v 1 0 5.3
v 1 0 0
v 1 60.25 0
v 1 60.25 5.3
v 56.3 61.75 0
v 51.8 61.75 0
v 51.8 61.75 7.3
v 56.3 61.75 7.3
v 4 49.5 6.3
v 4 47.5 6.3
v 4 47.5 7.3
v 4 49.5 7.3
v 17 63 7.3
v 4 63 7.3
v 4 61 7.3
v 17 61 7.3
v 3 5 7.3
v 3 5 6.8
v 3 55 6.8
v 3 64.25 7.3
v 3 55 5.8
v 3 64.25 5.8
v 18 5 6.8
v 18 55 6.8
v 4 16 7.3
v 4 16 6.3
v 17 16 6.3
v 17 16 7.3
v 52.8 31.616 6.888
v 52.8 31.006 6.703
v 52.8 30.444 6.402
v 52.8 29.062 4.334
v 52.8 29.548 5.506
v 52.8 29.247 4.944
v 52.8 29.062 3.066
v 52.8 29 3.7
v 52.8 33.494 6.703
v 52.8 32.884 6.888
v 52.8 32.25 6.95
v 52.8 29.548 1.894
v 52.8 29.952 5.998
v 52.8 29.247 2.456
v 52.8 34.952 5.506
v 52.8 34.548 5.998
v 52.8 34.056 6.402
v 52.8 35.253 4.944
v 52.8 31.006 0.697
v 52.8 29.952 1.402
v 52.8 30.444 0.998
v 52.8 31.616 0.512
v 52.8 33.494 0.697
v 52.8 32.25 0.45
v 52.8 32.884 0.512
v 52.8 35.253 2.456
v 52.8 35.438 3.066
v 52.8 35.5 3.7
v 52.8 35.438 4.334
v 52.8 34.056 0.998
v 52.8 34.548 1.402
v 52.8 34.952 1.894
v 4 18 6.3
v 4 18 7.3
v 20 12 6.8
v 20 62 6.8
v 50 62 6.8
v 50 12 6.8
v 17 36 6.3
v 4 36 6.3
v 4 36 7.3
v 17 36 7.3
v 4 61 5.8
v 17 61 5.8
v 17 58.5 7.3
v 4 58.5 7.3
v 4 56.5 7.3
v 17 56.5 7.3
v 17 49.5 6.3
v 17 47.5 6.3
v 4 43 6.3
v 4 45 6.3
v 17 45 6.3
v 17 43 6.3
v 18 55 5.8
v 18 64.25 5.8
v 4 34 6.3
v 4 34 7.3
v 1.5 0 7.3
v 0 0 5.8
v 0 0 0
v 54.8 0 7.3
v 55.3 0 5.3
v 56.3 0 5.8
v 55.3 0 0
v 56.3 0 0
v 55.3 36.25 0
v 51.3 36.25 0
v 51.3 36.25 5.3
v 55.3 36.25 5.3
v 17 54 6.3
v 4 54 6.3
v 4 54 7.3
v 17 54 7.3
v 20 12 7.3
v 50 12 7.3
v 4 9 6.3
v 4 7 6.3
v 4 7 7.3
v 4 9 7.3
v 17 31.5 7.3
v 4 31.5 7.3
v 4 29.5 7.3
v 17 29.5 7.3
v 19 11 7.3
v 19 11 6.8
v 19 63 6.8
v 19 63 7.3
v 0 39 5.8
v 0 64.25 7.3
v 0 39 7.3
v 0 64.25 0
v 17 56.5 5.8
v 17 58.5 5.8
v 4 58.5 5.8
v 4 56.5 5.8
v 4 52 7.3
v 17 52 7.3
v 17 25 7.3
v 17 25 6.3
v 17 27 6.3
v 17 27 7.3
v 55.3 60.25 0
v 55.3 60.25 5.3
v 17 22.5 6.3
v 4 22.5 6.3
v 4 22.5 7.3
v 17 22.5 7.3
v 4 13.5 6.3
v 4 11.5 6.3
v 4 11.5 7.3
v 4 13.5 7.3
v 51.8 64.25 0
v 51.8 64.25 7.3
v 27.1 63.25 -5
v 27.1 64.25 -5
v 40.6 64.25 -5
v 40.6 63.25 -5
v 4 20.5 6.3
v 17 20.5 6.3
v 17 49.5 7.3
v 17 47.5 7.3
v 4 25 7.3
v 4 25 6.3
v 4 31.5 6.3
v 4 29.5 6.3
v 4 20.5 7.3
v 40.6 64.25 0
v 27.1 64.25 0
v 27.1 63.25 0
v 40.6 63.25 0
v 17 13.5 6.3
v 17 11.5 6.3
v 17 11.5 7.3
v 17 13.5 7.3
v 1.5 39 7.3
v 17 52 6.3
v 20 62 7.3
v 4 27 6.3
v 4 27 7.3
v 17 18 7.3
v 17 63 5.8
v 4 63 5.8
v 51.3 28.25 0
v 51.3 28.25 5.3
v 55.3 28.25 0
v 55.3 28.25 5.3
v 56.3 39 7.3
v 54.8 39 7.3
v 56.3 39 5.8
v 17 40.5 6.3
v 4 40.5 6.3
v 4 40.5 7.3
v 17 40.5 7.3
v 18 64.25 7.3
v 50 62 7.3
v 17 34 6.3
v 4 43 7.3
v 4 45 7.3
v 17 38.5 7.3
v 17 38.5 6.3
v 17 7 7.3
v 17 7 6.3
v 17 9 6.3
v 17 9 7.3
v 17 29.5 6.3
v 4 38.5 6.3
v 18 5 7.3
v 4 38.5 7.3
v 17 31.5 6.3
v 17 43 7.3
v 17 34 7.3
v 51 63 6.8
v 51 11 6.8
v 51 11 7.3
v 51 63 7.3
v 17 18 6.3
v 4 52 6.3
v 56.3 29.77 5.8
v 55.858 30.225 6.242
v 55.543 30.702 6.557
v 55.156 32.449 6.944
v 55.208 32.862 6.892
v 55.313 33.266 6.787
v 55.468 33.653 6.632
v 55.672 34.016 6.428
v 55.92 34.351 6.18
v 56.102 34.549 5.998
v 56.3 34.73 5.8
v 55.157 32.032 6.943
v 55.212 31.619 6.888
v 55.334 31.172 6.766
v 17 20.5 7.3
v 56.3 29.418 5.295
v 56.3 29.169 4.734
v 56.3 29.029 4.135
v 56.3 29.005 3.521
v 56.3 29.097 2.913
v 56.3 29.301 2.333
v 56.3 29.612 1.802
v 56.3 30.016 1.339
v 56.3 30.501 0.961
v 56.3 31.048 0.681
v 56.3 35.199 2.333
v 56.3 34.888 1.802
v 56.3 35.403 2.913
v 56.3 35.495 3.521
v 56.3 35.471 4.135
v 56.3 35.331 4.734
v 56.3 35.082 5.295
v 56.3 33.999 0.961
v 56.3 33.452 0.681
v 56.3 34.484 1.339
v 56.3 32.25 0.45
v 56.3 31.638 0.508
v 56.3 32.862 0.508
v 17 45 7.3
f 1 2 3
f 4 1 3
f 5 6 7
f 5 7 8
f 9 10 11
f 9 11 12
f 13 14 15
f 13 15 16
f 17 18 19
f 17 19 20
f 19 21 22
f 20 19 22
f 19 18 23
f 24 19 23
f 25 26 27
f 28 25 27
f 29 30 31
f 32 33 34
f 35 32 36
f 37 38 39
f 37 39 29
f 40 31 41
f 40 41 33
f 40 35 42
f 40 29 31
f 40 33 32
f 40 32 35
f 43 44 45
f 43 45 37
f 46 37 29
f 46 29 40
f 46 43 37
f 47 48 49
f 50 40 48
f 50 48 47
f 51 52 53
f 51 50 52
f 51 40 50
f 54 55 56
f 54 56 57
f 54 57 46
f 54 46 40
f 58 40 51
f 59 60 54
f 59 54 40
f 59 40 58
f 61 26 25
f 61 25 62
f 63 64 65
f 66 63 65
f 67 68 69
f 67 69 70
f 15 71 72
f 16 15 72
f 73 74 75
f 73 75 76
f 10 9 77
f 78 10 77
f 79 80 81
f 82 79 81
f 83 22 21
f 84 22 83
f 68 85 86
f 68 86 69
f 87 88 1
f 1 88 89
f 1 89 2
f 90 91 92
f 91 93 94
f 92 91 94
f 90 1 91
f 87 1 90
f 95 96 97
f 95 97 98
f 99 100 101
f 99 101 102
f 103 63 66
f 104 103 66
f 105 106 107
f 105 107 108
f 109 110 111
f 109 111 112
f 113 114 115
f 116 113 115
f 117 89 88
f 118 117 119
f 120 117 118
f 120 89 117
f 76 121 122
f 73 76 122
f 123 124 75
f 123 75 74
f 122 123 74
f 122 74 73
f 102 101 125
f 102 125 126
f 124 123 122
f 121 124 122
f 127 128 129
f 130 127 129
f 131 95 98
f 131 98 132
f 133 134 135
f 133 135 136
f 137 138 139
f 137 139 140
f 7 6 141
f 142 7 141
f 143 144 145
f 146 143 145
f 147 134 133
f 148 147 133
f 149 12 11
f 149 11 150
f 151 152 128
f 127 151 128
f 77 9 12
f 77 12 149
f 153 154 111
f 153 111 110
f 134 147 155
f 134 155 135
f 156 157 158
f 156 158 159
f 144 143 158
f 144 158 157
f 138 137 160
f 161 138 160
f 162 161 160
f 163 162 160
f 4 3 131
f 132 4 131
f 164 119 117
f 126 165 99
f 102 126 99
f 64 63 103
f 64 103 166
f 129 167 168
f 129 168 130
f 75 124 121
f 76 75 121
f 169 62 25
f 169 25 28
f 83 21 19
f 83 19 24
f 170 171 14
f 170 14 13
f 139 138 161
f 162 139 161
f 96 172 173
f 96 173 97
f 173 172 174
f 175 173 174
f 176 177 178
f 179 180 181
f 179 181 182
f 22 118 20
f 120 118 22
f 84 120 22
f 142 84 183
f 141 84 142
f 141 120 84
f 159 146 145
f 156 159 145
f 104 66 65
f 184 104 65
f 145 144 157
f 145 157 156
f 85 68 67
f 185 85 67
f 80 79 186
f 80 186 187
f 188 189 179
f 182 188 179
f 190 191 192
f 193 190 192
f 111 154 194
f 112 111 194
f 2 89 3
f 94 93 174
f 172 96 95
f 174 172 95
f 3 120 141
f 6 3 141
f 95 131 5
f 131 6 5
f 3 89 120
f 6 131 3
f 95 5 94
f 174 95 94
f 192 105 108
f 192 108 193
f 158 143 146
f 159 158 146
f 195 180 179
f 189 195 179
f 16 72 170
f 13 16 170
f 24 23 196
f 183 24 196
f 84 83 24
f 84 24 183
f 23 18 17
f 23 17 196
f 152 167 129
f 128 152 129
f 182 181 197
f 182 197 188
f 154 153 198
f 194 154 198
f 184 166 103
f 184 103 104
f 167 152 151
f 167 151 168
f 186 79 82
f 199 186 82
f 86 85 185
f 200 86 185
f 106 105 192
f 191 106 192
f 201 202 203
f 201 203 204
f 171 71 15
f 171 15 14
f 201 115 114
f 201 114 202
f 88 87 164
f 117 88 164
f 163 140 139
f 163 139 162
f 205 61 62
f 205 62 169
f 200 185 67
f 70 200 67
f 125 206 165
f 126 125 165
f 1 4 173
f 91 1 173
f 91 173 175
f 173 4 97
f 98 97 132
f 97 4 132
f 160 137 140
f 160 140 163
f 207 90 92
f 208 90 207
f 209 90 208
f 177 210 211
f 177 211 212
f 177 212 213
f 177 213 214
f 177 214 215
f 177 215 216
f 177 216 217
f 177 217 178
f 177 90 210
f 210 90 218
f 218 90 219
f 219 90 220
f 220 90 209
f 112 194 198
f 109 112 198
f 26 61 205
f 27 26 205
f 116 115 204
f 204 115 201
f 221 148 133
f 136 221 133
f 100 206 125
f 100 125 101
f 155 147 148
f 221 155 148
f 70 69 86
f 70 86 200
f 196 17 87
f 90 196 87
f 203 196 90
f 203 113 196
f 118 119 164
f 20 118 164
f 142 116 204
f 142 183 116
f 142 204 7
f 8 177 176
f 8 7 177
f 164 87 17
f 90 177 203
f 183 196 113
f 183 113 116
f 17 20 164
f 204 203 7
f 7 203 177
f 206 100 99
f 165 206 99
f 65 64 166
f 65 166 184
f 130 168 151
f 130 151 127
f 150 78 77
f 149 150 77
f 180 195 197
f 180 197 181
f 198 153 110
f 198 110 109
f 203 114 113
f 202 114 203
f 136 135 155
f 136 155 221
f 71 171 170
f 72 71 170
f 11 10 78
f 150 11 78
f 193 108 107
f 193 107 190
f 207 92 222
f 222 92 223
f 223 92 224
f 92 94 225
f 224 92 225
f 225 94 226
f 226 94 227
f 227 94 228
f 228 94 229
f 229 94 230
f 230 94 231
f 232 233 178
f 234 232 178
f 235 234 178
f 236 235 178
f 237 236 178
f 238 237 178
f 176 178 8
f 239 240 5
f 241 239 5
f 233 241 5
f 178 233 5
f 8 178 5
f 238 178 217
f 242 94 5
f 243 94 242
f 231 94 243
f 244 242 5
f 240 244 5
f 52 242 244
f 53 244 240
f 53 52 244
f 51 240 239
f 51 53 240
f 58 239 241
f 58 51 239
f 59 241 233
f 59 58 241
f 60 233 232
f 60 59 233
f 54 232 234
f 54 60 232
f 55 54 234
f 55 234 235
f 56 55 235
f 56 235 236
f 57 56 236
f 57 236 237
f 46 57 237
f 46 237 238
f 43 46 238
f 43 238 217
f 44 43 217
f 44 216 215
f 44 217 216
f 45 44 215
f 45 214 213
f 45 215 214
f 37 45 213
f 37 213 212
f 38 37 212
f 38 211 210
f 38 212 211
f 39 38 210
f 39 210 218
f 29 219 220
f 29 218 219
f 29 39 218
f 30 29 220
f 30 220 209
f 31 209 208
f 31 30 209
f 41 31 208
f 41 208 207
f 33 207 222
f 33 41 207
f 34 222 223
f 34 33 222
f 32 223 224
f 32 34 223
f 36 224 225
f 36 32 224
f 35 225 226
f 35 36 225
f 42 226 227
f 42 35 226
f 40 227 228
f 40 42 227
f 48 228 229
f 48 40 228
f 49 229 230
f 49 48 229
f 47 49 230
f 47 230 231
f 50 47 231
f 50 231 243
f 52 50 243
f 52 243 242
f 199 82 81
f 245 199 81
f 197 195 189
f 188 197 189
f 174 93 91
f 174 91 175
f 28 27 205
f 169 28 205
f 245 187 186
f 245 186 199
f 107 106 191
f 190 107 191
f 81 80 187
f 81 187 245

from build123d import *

# Parameters (mm, degrees)
BOX017_W       = 30
BOX017_H       = 50
BOX017_DEPTH   = 0.5
BOX020_W       = 13
BOX020_H       = 2
BOX020_DEPTH   = 1
BOX021_W       = 13
BOX021_H       = 2
BOX021_DEPTH   = 1
BOX022_W       = 13
BOX022_H       = 2
BOX022_DEPTH   = 1
BOX023_W       = 13
BOX023_H       = 2
BOX023_DEPTH   = 1
BOX024_W       = 13
BOX024_H       = 2
BOX024_DEPTH   = 1
BOX025_W       = 13
BOX025_H       = 2
BOX025_DEPTH   = 1
BOX030_W       = 13
BOX030_H       = 2
BOX030_DEPTH   = 1
BOX031_W       = 13
BOX031_H       = 2
BOX031_DEPTH   = 1
BOX032_W       = 13
BOX032_H       = 2
BOX032_DEPTH   = 1
BOX034_W       = 13
BOX034_H       = 2
BOX034_DEPTH   = 1
BOX035_W       = 13
BOX035_H       = 2
BOX035_DEPTH   = 1
BOX038_W       = 13
BOX038_H       = 2
BOX038_DEPTH   = 1.5
BOX040_W       = 13
BOX040_H       = 2
BOX040_DEPTH   = 1.5
BOX043_W       = 13.5
BOX043_H       = 1
BOX043_DEPTH   = 5
CYLINDER_R     = 3.25
CYLINDER_DEPTH = 3.5
BOX042_W       = 54.3
BOX042_H       = 60.25
BOX042_DEPTH   = 5.3
BOX001_W       = 4.5
BOX001_H       = 2.5
BOX001_DEPTH   = 5.3
BOX_W          = 56.3
BOX_H          = 64.25
BOX_DEPTH      = 5.3
BOX041_W       = 32
BOX041_H       = 52
BOX041_DEPTH   = 0.5
BOX018_W       = 15
BOX018_H       = 53
BOX018_DEPTH   = 0.5
BOX008_W       = 56.3
BOX008_H       = 39
BOX008_DEPTH   = 2
CHAMFER_SIZE   = 1.5
BOX019_W       = 15
BOX019_H       = 9.25
BOX019_DEPTH   = 1.5
BOX029_W       = 17
BOX029_H       = 9.25
BOX029_DEPTH   = 1.5
BOX010_W       = 10
BOX010_H       = 10
BOX010_DEPTH   = 10
BOX007_W       = 56.3
BOX007_H       = 25.25
BOX007_DEPTH   = 2
BOX044_W       = 4
BOX044_H       = 8
BOX044_DEPTH   = 5.3


with BuildPart() as cube_game_lable_inner:
    # Box017 → Box017 (new body)
    with BuildSketch(Plane(origin=(20, 12, 6.8), x_dir=(1, 0, 0), z_dir=(0, 0, 1))):
        with Locations((15, 25)):
            Rectangle(BOX017_W, BOX017_H)
    extrude(amount=BOX017_DEPTH)


with BuildPart() as cube_ladders:
    # Box020 → Box020 (new body)
    with BuildSketch(Plane(origin=(4, 7, 6.3), x_dir=(1, 0, 0), z_dir=(0, 0, 1))):
        with Locations((6.5, 1)):
            Rectangle(BOX020_W, BOX020_H)
    extrude(amount=BOX020_DEPTH)


with BuildPart() as box021:
    # Box021 → Box021 (new body)
    with BuildSketch(Plane(origin=(4, 11.5, 6.3), x_dir=(1, 0, 0), z_dir=(0, 0, 1))):
        with Locations((6.5, 1)):
            Rectangle(BOX021_W, BOX021_H)
    extrude(amount=BOX021_DEPTH)


with BuildPart() as box022:
    # Box022 → Box022 (new body)
    with BuildSketch(Plane(origin=(4, 16, 6.3), x_dir=(1, 0, 0), z_dir=(0, 0, 1))):
        with Locations((6.5, 1)):
            Rectangle(BOX022_W, BOX022_H)
    extrude(amount=BOX022_DEPTH)


with BuildPart() as box023:
    # Box023 → Box023 (new body)
    with BuildSketch(Plane(origin=(4, 20.5, 6.3), x_dir=(1, 0, 0), z_dir=(0, 0, 1))):
        with Locations((6.5, 1)):
            Rectangle(BOX023_W, BOX023_H)
    extrude(amount=BOX023_DEPTH)


with BuildPart() as box024:
    # Box024 → Box024 (new body)
    with BuildSketch(Plane(origin=(4, 25, 6.3), x_dir=(1, 0, 0), z_dir=(0, 0, 1))):
        with Locations((6.5, 1)):
            Rectangle(BOX024_W, BOX024_H)
    extrude(amount=BOX024_DEPTH)


with BuildPart() as box025:
    # Box025 → Box025 (new body)
    with BuildSketch(Plane(origin=(4, 29.5, 6.3), x_dir=(1, 0, 0), z_dir=(0, 0, 1))):
        with Locations((6.5, 1)):
            Rectangle(BOX025_W, BOX025_H)
    extrude(amount=BOX025_DEPTH)


with BuildPart() as box030:
    # Box030 → Box030 (new body)
    with BuildSketch(Plane(origin=(4, 34, 6.3), x_dir=(1, 0, 0), z_dir=(0, 0, 1))):
        with Locations((6.5, 1)):
            Rectangle(BOX030_W, BOX030_H)
    extrude(amount=BOX030_DEPTH)


with BuildPart() as box031:
    # Box031 → Box031 (new body)
    with BuildSketch(Plane(origin=(4, 38.5, 6.3), x_dir=(1, 0, 0), z_dir=(0, 0, 1))):
        with Locations((6.5, 1)):
            Rectangle(BOX031_W, BOX031_H)
    extrude(amount=BOX031_DEPTH)


with BuildPart() as box032:
    # Box032 → Box032 (new body)
    with BuildSketch(Plane(origin=(4, 43, 6.3), x_dir=(1, 0, 0), z_dir=(0, 0, 1))):
        with Locations((6.5, 1)):
            Rectangle(BOX032_W, BOX032_H)
    extrude(amount=BOX032_DEPTH)


with BuildPart() as box034:
    # Box034 → Box034 (new body)
    with BuildSketch(Plane(origin=(4, 47.5, 6.3), x_dir=(1, 0, 0), z_dir=(0, 0, 1))):
        with Locations((6.5, 1)):
            Rectangle(BOX034_W, BOX034_H)
    extrude(amount=BOX034_DEPTH)


with BuildPart() as box035:
    # Box035 → Box035 (new body)
    with BuildSketch(Plane(origin=(4, 52, 6.3), x_dir=(1, 0, 0), z_dir=(0, 0, 1))):
        with Locations((6.5, 1)):
            Rectangle(BOX035_W, BOX035_H)
    extrude(amount=BOX035_DEPTH)


with BuildPart() as box038:
    # Box038 → Box038 (new body)
    with BuildSketch(Plane(origin=(4, 56.5, 5.8), x_dir=(1, 0, 0), z_dir=(0, 0, 1))):
        with Locations((6.5, 1)):
            Rectangle(BOX038_W, BOX038_H)
    extrude(amount=BOX038_DEPTH)


with BuildPart() as box040:
    # Box040 → Box040 (new body)
    with BuildSketch(Plane(origin=(4, 61, 5.8), x_dir=(1, 0, 0), z_dir=(0, 0, 1))):
        with Locations((6.5, 1)):
            Rectangle(BOX040_W, BOX040_H)
    extrude(amount=BOX040_DEPTH)


with BuildPart() as cube_sd_card_cover:
    # Box043 → Box043 (new body)
    with BuildSketch(Plane(origin=(27.1, 63.25, -5), x_dir=(1, 0, 0), z_dir=(0, 0, 1))):
        with Locations((6.75, 0.5)):
            Rectangle(BOX043_W, BOX043_H)
    extrude(amount=BOX043_DEPTH)


with BuildPart() as cylinder_magnet:
    # Cylinder → Cylinder (new body)
    with BuildSketch(Plane(origin=(52.8, 32.25, 3.7), x_dir=(0, 0, -1), z_dir=(1, 0, 0))):
        Circle(CYLINDER_R)
    extrude(amount=CYLINDER_DEPTH)


with BuildPart() as box042:
    # Box042 → Box042 (new body)
    with BuildSketch(Plane(origin=(1, 0, 0), x_dir=(1, 0, 0), z_dir=(0, 0, 1))):
        with Locations((27.15, 30.125)):
            Rectangle(BOX042_W, BOX042_H)
    extrude(amount=BOX042_DEPTH)


with BuildPart() as cube_corner_inner:
    # Box001 → Box001 (new body)
    with BuildSketch(Plane(origin=(51.8, 61.75, 0), x_dir=(1, 0, 0), z_dir=(0, 0, 1))):
        with Locations((2.25, 1.25)):
            Rectangle(BOX001_W, BOX001_H)
    extrude(amount=BOX001_DEPTH)


with BuildPart() as cut014:
    # Box → Box (new body)
    with BuildSketch(Plane.XY):
        with Locations((28.15, 32.125)):
            Rectangle(BOX_W, BOX_H)
    extrude(amount=BOX_DEPTH)

    # Cut: cut Cube(corner_inner)
    add(cube_corner_inner.part, mode=Mode.SUBTRACT)

    # Cut014: cut Box042
    add(box042.part, mode=Mode.SUBTRACT)


with BuildPart() as cube_game_lable_outer:
    # Box041 → Box041 (new body)
    with BuildSketch(Plane(origin=(19, 11, 6.8), x_dir=(1, 0, 0), z_dir=(0, 0, 1))):
        with Locations((16, 26)):
            Rectangle(BOX041_W, BOX041_H)
    extrude(amount=BOX041_DEPTH)


with BuildPart() as cube_cube_strips:
    # Box018 → Box018 (new body)
    with BuildSketch(Plane(origin=(3, 5, 6.8), x_dir=(1, 0, 0), z_dir=(0, 0, 1))):
        with Locations((7.5, 26.5)):
            Rectangle(BOX018_W, BOX018_H)
    extrude(amount=BOX018_DEPTH)


with BuildPart() as chamfer_body:
    # Box008 → Box008 (new body)
    with BuildSketch(Plane.XY.offset(5.3)):
        with Locations((28.15, 19.5)):
            Rectangle(BOX008_W, BOX008_H)
    extrude(amount=BOX008_DEPTH)

    # Chamfer
    chamfer_edges = [chamfer_body.edges().sort_by_distance(p)[0] for p in [
        (0, 19.5, 7.3),
        (56.3, 19.5, 7.3),
    ]]
    chamfer(chamfer_edges, length=CHAMFER_SIZE)


with BuildPart() as cube_cube_strip_top:
    # Box019 → Box019 (new body)
    with BuildSketch(Plane(origin=(3, 55, 5.8), x_dir=(1, 0, 0), z_dir=(0, 0, 1))):
        with Locations((7.5, 4.625)):
            Rectangle(BOX019_W, BOX019_H)
    extrude(amount=BOX019_DEPTH)


with BuildPart() as cube_cube_strip_top_outer:
    # Box029 → Box029 (new body)
    with BuildSketch(Plane(origin=(2, 55, 5.8), x_dir=(1, 0, 0), z_dir=(0, 0, 1))):
        with Locations((8.5, 4.625)):
            Rectangle(BOX029_W, BOX029_H)
    extrude(amount=BOX029_DEPTH)


with BuildPart() as cube_top_corner_cut:
    # Box010 → Box010 (new body)
    with BuildSketch(Plane(origin=(51.8, 61.75, 0), x_dir=(1, 0, 0), z_dir=(0, 0, 1))):
        with Locations((5, 5)):
            Rectangle(BOX010_W, BOX010_H)
    extrude(amount=BOX010_DEPTH)


with BuildPart() as cut013:
    # Box007 → Box007 (new body)
    with BuildSketch(Plane(origin=(0, 39, 5.3), x_dir=(1, 0, 0), z_dir=(0, 0, 1))):
        with Locations((28.15, 12.625)):
            Rectangle(BOX007_W, BOX007_H)
    extrude(amount=BOX007_DEPTH)

    # Cut006: cut Cube(top_corner_cut)
    add(cube_top_corner_cut.part, mode=Mode.SUBTRACT)

    # Fusion003: union Cube(cube_strip_top_outer)
    add(cube_cube_strip_top_outer.part)

    # Cut008: cut Cube(cube_strip_top)
    add(cube_cube_strip_top.part, mode=Mode.SUBTRACT)

    # Fusion004: union Chamfer body
    add(chamfer_body.part)

    # Cut012: cut Cube(cube_strips)
    add(cube_cube_strips.part, mode=Mode.SUBTRACT)

    # Cut013: cut Cube(game_lable_outer)
    add(cube_game_lable_outer.part, mode=Mode.SUBTRACT)


with BuildPart() as cut015:
    # Box044 → Box044 (new body)
    with BuildSketch(Plane(origin=(51.3, 28.25, 0), x_dir=(1, 0, 0), z_dir=(0, 0, 1))):
        with Locations((2, 4)):
            Rectangle(BOX044_W, BOX044_H)
    extrude(amount=BOX044_DEPTH)

    # Fusion: union Cut014, Cut013
    add(cut014.part)
    add(cut013.part)

    # Cut015: cut Cylinder(magnet)
    add(cylinder_magnet.part, mode=Mode.SUBTRACT)


solid = Compound([cube_game_lable_inner.part, cube_ladders.part, box021.part, box022.part, box023.part, box024.part, box025.part, box030.part, box031.part, box032.part, box034.part, box035.part, box038.part, box040.part, cube_sd_card_cover.part, cut015.part])
